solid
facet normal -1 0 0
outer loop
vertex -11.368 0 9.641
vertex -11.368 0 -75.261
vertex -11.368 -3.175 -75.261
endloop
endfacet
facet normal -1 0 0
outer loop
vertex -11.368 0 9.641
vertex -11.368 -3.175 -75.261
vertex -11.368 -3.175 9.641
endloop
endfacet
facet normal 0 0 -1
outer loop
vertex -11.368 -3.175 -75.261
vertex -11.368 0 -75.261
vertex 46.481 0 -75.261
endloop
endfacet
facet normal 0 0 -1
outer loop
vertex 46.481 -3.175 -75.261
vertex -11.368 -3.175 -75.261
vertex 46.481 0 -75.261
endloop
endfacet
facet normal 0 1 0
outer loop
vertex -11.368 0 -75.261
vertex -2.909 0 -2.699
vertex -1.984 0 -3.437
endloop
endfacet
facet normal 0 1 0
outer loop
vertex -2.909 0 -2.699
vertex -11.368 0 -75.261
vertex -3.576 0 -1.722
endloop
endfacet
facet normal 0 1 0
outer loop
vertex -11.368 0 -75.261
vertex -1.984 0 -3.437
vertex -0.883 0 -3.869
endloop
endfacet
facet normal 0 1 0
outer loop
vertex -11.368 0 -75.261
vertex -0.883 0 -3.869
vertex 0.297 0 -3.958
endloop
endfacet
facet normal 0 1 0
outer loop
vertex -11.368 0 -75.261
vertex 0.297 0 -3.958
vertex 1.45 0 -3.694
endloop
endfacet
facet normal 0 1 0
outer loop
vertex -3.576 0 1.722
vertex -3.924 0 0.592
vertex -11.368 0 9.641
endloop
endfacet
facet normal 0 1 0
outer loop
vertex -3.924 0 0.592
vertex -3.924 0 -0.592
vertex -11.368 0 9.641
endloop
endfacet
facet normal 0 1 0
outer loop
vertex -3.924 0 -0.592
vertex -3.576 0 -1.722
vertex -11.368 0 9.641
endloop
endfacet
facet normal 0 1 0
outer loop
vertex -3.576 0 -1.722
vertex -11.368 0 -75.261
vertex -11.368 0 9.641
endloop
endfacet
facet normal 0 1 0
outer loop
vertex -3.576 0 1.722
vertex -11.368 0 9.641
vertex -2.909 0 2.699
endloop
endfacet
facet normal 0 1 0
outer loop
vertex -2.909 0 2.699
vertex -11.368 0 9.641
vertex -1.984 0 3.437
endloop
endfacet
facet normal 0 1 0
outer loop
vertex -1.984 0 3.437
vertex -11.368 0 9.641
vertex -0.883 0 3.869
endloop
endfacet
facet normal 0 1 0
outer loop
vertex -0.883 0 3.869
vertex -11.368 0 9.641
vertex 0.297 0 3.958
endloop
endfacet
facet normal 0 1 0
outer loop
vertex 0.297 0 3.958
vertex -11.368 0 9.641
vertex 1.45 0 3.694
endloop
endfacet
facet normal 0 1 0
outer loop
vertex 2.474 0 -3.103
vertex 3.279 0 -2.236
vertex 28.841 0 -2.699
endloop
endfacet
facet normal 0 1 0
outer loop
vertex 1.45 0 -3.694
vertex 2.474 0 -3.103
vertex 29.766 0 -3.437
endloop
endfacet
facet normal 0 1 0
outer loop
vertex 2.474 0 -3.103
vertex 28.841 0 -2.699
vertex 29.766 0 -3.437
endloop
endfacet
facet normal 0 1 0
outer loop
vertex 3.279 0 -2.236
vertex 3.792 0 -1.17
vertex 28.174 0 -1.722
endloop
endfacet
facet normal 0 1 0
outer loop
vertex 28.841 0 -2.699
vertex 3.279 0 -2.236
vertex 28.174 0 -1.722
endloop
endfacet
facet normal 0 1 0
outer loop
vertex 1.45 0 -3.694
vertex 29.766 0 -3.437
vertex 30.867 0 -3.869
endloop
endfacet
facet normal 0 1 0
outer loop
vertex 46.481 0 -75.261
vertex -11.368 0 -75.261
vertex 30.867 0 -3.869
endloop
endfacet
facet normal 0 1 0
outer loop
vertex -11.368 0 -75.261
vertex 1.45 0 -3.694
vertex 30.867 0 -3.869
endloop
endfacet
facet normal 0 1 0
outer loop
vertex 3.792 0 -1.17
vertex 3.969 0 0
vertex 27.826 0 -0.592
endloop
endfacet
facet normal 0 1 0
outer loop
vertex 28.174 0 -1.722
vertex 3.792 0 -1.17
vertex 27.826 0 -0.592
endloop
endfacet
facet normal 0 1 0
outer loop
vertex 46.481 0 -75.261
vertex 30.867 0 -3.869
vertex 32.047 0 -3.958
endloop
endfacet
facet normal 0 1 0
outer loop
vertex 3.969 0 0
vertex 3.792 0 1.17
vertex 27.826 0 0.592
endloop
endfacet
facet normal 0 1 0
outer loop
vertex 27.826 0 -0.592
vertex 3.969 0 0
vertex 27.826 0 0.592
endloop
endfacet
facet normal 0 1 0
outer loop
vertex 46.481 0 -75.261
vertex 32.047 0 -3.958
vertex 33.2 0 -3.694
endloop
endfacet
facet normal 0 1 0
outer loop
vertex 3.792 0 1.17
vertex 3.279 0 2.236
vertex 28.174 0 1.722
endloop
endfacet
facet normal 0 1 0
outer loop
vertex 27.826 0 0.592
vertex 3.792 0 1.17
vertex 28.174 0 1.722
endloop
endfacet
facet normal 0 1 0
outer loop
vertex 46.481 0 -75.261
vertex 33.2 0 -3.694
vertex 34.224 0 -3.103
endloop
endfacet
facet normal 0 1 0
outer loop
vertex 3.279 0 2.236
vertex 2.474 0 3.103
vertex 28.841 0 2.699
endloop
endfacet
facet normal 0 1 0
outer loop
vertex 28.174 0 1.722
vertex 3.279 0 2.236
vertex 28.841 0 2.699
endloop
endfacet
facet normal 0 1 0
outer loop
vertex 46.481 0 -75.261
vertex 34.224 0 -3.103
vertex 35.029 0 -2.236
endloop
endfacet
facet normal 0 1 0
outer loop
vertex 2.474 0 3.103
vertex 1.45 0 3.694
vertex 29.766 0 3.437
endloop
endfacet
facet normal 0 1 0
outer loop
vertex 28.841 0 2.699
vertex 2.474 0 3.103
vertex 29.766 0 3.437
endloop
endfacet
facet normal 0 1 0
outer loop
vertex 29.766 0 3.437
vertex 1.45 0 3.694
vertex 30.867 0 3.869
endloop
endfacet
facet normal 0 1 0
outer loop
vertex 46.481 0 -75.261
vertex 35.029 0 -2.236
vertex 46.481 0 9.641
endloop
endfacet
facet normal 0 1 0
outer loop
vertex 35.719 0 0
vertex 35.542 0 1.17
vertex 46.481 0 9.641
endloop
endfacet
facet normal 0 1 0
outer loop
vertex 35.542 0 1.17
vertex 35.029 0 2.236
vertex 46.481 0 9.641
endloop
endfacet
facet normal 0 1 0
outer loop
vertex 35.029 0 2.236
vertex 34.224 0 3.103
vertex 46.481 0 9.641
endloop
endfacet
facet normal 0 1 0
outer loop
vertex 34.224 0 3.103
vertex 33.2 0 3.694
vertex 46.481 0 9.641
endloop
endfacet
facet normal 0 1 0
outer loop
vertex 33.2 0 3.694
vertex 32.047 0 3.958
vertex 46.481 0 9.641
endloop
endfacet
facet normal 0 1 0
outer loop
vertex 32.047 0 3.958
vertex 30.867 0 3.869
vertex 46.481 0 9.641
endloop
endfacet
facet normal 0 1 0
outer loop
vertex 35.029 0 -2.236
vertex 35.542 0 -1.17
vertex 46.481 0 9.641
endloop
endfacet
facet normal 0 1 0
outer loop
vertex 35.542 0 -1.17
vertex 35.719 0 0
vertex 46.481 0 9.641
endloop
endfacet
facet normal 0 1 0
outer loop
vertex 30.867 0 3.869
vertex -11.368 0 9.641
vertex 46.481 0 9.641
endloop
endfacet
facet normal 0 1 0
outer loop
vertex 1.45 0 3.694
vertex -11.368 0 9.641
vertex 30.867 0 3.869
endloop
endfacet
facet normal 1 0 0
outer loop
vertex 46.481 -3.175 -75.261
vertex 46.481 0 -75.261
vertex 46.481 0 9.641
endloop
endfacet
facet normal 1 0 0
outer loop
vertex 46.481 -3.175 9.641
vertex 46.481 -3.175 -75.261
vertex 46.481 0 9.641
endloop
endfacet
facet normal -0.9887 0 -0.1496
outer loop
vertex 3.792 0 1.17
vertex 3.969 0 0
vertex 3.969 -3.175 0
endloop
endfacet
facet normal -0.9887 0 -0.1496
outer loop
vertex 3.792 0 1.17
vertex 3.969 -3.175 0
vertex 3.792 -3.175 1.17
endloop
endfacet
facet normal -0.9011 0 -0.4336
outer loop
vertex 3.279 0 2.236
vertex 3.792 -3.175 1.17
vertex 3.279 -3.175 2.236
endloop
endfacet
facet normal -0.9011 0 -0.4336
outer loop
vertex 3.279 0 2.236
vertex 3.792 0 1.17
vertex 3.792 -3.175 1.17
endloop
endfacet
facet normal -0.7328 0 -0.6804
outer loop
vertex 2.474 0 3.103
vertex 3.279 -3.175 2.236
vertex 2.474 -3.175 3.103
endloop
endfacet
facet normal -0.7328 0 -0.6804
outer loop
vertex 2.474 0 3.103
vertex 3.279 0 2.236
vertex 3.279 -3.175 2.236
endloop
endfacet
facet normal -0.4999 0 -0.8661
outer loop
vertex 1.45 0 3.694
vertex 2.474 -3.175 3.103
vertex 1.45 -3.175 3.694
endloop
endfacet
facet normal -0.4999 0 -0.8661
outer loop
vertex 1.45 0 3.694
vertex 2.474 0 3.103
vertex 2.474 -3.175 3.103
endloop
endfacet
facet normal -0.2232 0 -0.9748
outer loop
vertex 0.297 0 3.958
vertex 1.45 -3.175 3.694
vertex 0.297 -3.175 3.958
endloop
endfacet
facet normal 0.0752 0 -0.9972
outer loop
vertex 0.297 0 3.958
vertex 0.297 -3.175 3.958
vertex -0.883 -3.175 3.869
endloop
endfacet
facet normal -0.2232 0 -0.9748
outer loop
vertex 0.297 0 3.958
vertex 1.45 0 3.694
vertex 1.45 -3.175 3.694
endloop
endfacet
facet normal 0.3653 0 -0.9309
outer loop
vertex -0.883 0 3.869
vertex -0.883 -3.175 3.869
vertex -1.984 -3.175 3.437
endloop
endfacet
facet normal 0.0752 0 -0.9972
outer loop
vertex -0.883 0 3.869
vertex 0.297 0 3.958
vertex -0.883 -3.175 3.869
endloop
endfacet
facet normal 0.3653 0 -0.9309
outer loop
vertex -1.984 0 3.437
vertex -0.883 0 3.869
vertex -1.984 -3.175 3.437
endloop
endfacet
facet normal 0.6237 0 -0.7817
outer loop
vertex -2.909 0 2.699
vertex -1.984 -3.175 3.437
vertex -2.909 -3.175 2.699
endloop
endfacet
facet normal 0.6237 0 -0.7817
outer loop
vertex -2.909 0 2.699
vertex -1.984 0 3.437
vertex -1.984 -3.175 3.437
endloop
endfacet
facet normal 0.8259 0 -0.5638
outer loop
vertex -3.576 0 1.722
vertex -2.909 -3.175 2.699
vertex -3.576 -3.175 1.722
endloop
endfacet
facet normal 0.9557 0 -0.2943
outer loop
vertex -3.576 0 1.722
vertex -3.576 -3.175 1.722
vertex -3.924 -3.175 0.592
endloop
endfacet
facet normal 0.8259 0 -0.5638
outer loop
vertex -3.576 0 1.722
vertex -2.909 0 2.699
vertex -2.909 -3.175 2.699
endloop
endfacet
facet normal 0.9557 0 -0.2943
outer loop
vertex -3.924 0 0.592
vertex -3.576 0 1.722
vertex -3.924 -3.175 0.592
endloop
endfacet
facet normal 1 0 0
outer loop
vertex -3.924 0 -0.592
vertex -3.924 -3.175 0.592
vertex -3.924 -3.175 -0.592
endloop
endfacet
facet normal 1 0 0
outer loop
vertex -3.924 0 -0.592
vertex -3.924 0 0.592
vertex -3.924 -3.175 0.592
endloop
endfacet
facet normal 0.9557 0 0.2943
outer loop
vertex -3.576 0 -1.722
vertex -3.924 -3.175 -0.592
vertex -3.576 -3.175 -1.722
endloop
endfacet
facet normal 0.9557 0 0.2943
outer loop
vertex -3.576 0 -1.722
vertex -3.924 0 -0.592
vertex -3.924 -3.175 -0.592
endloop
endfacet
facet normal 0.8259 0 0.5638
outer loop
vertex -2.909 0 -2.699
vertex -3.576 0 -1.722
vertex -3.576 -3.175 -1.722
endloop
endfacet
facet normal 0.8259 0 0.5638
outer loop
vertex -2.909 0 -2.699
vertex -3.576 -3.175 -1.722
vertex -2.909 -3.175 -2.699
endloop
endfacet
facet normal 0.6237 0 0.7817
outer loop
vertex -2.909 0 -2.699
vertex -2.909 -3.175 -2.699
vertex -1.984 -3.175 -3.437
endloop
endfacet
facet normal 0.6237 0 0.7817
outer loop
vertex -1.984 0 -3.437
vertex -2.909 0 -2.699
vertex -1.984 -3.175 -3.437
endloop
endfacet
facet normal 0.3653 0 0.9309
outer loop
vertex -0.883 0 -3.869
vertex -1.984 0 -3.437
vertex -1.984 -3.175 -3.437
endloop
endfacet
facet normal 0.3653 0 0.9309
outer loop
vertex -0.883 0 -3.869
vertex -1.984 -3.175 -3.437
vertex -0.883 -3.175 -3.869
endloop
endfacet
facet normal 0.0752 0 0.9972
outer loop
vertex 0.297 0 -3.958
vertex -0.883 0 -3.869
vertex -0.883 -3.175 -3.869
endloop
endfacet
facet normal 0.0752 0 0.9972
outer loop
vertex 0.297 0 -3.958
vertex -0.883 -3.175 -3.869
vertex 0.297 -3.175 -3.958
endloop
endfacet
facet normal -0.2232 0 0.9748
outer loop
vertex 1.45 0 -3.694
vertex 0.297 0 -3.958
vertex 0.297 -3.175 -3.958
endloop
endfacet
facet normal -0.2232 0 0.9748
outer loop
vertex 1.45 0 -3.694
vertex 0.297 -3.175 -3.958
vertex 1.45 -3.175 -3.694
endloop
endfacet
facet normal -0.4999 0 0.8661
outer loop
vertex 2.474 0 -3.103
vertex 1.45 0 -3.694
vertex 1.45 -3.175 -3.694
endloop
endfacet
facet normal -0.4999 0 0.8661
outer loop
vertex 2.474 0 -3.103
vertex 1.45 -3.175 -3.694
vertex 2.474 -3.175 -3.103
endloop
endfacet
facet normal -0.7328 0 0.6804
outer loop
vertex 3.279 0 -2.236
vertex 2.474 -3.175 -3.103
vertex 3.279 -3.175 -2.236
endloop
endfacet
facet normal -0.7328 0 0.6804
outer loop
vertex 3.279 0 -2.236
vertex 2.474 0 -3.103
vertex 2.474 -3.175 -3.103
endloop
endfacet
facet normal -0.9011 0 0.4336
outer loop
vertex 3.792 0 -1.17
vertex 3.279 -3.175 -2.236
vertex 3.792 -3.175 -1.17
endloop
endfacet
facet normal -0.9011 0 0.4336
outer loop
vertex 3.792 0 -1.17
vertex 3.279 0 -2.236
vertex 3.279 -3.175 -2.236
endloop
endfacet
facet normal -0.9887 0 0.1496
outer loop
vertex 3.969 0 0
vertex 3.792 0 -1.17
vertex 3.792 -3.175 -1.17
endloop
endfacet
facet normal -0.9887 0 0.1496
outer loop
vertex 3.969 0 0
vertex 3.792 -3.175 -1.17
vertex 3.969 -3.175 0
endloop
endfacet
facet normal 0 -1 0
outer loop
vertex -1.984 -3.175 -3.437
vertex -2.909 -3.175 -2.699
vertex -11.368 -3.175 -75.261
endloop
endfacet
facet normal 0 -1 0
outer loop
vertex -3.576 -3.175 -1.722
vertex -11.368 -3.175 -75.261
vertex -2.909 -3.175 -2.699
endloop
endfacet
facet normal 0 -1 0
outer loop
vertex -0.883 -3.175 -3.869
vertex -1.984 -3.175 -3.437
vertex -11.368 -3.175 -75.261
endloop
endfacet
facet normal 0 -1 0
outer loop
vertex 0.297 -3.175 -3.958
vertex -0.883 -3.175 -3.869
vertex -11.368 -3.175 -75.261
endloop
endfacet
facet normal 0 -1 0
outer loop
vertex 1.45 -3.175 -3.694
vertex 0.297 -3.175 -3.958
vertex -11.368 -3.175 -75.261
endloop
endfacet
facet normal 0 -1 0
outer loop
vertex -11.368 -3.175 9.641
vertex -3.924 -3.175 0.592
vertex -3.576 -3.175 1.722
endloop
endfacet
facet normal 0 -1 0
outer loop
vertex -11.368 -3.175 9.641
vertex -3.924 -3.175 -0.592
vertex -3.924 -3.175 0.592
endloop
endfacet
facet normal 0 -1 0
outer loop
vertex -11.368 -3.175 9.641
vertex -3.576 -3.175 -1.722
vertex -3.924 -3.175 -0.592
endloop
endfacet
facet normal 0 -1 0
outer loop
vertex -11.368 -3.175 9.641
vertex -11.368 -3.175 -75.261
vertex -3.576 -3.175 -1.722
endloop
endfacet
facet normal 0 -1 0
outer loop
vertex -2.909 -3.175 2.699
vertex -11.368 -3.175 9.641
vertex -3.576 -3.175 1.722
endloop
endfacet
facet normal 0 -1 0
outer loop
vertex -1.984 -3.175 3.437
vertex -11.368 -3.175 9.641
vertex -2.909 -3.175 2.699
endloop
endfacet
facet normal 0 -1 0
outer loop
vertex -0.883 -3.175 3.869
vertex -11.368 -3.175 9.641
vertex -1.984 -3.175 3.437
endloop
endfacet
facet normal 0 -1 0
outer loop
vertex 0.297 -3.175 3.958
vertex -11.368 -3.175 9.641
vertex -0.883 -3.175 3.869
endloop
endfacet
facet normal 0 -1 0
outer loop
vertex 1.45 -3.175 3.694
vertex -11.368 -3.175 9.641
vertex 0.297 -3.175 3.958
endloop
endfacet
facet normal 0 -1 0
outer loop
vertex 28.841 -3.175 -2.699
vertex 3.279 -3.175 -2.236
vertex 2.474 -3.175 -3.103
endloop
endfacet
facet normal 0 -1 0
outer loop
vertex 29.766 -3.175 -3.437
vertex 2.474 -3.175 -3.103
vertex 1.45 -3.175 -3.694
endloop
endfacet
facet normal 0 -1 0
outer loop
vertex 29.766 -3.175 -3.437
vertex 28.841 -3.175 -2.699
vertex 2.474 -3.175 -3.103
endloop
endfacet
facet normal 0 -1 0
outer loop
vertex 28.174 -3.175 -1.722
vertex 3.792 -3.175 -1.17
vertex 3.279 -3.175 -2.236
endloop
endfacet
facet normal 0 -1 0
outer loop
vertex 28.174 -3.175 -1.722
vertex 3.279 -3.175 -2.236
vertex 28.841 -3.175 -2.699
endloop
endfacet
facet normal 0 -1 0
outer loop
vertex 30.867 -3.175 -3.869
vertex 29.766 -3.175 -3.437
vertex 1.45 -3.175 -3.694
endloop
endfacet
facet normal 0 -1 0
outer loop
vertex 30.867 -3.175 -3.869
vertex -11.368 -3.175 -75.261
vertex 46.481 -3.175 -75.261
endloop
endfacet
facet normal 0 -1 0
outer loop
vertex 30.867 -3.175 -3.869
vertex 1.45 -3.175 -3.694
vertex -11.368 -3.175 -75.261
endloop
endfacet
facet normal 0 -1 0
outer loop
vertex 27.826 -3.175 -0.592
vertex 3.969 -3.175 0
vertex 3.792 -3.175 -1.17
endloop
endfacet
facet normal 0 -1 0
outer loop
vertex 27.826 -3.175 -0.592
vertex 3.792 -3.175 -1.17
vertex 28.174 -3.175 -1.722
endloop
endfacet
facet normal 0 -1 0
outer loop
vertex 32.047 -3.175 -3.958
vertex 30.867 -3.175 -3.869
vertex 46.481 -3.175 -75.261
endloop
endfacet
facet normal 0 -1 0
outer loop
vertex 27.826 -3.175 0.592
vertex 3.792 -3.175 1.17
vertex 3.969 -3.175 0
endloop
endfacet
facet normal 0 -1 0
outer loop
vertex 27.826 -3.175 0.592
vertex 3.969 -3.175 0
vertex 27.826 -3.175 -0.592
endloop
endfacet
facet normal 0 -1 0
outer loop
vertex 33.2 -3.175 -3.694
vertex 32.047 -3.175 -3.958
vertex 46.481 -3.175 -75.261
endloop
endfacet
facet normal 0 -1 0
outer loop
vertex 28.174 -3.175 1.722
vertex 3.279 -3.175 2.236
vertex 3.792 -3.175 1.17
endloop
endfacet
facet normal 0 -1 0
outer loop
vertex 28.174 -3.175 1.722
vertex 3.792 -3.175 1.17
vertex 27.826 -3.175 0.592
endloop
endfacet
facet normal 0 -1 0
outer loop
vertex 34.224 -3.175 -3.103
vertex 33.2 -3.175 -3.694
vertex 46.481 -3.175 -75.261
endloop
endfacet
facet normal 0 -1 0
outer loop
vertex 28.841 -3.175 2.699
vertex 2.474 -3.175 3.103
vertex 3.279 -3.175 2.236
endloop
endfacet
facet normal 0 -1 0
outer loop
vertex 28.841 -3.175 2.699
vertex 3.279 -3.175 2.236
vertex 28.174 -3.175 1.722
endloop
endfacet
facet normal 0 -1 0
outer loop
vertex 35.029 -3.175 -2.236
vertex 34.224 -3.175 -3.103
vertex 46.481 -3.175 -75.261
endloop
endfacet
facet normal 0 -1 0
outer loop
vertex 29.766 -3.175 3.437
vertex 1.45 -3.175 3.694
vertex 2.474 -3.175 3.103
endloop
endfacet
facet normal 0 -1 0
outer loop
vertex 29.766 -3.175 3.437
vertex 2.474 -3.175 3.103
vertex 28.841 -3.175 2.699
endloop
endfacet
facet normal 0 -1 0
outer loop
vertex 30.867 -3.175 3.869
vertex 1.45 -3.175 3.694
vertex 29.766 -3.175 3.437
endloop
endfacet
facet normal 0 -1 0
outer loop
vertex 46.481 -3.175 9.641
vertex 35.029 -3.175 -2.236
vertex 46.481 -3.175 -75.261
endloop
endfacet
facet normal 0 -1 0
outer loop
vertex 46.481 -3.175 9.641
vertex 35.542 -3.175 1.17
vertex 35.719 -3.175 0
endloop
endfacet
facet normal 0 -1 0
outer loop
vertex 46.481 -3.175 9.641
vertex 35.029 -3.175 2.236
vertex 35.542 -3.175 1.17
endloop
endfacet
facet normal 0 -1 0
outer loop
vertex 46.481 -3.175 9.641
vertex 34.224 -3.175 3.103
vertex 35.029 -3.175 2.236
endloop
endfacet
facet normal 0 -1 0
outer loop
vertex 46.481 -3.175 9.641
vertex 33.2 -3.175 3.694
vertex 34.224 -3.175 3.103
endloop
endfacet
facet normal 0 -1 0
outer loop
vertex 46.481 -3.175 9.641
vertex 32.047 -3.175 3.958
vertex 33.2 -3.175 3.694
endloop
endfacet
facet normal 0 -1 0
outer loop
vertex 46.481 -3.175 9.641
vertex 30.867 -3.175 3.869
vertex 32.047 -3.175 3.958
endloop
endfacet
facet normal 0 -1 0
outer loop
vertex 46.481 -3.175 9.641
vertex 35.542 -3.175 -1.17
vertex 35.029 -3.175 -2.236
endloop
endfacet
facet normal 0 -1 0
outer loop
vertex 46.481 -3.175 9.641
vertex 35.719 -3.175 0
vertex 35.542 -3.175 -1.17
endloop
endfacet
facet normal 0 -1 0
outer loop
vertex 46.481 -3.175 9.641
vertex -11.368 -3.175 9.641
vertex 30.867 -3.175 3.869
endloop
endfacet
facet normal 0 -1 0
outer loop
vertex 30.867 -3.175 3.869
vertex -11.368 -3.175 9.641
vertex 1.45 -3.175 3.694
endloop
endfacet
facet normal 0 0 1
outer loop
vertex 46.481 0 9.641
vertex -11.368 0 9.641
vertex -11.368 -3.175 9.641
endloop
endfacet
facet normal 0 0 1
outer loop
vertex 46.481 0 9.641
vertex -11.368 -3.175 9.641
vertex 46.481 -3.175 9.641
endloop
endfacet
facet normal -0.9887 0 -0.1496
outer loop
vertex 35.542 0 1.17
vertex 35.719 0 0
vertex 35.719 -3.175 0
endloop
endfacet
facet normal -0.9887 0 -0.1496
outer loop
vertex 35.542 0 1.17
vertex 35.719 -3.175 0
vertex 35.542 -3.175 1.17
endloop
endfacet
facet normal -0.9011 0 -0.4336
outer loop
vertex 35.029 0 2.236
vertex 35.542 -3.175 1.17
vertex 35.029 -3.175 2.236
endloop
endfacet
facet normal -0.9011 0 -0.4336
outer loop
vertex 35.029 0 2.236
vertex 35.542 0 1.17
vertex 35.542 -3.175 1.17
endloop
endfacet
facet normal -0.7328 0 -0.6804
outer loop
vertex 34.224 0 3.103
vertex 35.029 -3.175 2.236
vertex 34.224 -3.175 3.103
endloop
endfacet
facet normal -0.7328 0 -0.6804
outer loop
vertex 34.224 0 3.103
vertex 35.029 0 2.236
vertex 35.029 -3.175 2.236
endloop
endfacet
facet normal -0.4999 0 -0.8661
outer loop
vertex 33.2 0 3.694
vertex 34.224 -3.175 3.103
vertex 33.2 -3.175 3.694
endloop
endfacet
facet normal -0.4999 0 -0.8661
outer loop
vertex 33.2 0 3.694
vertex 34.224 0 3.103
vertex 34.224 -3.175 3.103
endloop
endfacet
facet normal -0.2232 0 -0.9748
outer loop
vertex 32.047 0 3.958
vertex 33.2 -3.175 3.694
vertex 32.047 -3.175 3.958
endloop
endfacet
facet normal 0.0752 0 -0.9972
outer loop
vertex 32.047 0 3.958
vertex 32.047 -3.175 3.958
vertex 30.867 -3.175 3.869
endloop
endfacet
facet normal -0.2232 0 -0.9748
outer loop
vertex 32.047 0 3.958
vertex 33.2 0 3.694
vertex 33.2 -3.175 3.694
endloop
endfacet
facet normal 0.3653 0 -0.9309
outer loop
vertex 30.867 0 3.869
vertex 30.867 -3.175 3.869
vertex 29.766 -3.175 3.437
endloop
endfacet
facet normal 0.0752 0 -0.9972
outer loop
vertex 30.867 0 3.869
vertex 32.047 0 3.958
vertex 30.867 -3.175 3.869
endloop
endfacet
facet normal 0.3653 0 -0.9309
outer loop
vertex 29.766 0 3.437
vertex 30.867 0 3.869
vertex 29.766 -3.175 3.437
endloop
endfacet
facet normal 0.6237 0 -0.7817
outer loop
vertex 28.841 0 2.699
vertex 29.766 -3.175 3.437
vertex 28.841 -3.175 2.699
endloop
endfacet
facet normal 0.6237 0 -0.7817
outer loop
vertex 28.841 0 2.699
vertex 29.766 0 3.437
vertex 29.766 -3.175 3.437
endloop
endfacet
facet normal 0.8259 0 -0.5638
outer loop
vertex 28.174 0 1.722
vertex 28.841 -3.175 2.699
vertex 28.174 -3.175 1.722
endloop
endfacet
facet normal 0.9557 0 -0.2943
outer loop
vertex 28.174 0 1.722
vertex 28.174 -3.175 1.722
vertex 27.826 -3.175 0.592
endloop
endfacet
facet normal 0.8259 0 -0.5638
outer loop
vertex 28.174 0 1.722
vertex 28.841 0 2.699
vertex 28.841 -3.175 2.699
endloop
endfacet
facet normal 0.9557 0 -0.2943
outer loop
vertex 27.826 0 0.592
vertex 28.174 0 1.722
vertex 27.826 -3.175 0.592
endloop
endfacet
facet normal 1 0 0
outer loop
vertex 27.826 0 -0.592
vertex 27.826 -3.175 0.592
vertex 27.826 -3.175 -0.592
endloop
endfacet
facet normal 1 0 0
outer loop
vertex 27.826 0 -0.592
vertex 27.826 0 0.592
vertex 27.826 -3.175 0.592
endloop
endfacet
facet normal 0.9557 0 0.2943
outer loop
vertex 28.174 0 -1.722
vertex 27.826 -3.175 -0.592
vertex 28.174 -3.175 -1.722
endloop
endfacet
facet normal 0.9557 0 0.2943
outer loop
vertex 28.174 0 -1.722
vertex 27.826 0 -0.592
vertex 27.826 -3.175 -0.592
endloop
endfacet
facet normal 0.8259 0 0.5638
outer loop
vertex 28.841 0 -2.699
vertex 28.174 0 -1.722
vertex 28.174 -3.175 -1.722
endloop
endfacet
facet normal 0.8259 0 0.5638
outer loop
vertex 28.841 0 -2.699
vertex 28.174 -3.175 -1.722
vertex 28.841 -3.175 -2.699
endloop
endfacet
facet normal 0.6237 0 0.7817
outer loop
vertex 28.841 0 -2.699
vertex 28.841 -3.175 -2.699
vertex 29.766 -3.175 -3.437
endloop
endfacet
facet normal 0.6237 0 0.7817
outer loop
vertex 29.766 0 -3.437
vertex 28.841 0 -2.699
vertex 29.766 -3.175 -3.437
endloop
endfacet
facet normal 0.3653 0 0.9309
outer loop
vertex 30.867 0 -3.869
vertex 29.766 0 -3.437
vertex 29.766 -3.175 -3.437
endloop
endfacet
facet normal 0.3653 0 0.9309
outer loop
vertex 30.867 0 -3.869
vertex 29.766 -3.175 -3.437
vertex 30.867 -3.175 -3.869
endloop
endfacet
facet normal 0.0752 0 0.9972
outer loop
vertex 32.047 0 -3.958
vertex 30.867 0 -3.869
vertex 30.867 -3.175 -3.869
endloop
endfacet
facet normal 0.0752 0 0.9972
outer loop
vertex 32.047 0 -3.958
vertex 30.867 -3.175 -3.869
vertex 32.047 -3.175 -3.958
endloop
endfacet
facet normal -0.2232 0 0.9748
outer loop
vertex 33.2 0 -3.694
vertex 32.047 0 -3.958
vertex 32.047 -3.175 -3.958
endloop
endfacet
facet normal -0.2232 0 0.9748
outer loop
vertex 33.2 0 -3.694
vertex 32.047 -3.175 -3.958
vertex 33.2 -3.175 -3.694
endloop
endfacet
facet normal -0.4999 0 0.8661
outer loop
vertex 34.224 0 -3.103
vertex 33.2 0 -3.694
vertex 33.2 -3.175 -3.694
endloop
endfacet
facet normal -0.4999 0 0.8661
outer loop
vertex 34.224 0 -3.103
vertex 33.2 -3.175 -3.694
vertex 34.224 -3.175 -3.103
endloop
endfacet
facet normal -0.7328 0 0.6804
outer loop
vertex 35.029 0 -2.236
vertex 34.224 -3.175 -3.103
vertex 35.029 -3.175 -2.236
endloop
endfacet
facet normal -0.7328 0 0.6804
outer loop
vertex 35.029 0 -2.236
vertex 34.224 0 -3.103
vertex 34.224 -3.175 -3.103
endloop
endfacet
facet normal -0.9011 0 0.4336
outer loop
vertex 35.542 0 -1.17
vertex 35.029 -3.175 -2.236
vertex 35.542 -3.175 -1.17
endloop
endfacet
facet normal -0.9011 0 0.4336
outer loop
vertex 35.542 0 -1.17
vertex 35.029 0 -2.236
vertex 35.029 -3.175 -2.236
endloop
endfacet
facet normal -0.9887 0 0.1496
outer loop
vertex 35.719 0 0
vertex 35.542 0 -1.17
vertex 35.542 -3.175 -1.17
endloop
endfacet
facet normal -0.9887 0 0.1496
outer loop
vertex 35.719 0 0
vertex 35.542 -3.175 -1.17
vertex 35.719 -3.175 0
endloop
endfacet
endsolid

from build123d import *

# Parameters (mm, degrees)
F0_W     = 57.848958
F0_H     = 84.902698
F0_R     = 3.96875
F1_DEPTH = 3.175


with BuildPart() as f1:
    # F0 (on Front) → F1 (new body)
    with BuildSketch(Plane.XZ):
        with Locations((17.556151, -32.809856)):
            Rectangle(F0_W, F0_H)
        Circle(F0_R, mode=Mode.SUBTRACT)
        with Locations((31.75, 0)):
            Circle(F0_R, mode=Mode.SUBTRACT)
    extrude(amount=F1_DEPTH)


solid = f1.part
